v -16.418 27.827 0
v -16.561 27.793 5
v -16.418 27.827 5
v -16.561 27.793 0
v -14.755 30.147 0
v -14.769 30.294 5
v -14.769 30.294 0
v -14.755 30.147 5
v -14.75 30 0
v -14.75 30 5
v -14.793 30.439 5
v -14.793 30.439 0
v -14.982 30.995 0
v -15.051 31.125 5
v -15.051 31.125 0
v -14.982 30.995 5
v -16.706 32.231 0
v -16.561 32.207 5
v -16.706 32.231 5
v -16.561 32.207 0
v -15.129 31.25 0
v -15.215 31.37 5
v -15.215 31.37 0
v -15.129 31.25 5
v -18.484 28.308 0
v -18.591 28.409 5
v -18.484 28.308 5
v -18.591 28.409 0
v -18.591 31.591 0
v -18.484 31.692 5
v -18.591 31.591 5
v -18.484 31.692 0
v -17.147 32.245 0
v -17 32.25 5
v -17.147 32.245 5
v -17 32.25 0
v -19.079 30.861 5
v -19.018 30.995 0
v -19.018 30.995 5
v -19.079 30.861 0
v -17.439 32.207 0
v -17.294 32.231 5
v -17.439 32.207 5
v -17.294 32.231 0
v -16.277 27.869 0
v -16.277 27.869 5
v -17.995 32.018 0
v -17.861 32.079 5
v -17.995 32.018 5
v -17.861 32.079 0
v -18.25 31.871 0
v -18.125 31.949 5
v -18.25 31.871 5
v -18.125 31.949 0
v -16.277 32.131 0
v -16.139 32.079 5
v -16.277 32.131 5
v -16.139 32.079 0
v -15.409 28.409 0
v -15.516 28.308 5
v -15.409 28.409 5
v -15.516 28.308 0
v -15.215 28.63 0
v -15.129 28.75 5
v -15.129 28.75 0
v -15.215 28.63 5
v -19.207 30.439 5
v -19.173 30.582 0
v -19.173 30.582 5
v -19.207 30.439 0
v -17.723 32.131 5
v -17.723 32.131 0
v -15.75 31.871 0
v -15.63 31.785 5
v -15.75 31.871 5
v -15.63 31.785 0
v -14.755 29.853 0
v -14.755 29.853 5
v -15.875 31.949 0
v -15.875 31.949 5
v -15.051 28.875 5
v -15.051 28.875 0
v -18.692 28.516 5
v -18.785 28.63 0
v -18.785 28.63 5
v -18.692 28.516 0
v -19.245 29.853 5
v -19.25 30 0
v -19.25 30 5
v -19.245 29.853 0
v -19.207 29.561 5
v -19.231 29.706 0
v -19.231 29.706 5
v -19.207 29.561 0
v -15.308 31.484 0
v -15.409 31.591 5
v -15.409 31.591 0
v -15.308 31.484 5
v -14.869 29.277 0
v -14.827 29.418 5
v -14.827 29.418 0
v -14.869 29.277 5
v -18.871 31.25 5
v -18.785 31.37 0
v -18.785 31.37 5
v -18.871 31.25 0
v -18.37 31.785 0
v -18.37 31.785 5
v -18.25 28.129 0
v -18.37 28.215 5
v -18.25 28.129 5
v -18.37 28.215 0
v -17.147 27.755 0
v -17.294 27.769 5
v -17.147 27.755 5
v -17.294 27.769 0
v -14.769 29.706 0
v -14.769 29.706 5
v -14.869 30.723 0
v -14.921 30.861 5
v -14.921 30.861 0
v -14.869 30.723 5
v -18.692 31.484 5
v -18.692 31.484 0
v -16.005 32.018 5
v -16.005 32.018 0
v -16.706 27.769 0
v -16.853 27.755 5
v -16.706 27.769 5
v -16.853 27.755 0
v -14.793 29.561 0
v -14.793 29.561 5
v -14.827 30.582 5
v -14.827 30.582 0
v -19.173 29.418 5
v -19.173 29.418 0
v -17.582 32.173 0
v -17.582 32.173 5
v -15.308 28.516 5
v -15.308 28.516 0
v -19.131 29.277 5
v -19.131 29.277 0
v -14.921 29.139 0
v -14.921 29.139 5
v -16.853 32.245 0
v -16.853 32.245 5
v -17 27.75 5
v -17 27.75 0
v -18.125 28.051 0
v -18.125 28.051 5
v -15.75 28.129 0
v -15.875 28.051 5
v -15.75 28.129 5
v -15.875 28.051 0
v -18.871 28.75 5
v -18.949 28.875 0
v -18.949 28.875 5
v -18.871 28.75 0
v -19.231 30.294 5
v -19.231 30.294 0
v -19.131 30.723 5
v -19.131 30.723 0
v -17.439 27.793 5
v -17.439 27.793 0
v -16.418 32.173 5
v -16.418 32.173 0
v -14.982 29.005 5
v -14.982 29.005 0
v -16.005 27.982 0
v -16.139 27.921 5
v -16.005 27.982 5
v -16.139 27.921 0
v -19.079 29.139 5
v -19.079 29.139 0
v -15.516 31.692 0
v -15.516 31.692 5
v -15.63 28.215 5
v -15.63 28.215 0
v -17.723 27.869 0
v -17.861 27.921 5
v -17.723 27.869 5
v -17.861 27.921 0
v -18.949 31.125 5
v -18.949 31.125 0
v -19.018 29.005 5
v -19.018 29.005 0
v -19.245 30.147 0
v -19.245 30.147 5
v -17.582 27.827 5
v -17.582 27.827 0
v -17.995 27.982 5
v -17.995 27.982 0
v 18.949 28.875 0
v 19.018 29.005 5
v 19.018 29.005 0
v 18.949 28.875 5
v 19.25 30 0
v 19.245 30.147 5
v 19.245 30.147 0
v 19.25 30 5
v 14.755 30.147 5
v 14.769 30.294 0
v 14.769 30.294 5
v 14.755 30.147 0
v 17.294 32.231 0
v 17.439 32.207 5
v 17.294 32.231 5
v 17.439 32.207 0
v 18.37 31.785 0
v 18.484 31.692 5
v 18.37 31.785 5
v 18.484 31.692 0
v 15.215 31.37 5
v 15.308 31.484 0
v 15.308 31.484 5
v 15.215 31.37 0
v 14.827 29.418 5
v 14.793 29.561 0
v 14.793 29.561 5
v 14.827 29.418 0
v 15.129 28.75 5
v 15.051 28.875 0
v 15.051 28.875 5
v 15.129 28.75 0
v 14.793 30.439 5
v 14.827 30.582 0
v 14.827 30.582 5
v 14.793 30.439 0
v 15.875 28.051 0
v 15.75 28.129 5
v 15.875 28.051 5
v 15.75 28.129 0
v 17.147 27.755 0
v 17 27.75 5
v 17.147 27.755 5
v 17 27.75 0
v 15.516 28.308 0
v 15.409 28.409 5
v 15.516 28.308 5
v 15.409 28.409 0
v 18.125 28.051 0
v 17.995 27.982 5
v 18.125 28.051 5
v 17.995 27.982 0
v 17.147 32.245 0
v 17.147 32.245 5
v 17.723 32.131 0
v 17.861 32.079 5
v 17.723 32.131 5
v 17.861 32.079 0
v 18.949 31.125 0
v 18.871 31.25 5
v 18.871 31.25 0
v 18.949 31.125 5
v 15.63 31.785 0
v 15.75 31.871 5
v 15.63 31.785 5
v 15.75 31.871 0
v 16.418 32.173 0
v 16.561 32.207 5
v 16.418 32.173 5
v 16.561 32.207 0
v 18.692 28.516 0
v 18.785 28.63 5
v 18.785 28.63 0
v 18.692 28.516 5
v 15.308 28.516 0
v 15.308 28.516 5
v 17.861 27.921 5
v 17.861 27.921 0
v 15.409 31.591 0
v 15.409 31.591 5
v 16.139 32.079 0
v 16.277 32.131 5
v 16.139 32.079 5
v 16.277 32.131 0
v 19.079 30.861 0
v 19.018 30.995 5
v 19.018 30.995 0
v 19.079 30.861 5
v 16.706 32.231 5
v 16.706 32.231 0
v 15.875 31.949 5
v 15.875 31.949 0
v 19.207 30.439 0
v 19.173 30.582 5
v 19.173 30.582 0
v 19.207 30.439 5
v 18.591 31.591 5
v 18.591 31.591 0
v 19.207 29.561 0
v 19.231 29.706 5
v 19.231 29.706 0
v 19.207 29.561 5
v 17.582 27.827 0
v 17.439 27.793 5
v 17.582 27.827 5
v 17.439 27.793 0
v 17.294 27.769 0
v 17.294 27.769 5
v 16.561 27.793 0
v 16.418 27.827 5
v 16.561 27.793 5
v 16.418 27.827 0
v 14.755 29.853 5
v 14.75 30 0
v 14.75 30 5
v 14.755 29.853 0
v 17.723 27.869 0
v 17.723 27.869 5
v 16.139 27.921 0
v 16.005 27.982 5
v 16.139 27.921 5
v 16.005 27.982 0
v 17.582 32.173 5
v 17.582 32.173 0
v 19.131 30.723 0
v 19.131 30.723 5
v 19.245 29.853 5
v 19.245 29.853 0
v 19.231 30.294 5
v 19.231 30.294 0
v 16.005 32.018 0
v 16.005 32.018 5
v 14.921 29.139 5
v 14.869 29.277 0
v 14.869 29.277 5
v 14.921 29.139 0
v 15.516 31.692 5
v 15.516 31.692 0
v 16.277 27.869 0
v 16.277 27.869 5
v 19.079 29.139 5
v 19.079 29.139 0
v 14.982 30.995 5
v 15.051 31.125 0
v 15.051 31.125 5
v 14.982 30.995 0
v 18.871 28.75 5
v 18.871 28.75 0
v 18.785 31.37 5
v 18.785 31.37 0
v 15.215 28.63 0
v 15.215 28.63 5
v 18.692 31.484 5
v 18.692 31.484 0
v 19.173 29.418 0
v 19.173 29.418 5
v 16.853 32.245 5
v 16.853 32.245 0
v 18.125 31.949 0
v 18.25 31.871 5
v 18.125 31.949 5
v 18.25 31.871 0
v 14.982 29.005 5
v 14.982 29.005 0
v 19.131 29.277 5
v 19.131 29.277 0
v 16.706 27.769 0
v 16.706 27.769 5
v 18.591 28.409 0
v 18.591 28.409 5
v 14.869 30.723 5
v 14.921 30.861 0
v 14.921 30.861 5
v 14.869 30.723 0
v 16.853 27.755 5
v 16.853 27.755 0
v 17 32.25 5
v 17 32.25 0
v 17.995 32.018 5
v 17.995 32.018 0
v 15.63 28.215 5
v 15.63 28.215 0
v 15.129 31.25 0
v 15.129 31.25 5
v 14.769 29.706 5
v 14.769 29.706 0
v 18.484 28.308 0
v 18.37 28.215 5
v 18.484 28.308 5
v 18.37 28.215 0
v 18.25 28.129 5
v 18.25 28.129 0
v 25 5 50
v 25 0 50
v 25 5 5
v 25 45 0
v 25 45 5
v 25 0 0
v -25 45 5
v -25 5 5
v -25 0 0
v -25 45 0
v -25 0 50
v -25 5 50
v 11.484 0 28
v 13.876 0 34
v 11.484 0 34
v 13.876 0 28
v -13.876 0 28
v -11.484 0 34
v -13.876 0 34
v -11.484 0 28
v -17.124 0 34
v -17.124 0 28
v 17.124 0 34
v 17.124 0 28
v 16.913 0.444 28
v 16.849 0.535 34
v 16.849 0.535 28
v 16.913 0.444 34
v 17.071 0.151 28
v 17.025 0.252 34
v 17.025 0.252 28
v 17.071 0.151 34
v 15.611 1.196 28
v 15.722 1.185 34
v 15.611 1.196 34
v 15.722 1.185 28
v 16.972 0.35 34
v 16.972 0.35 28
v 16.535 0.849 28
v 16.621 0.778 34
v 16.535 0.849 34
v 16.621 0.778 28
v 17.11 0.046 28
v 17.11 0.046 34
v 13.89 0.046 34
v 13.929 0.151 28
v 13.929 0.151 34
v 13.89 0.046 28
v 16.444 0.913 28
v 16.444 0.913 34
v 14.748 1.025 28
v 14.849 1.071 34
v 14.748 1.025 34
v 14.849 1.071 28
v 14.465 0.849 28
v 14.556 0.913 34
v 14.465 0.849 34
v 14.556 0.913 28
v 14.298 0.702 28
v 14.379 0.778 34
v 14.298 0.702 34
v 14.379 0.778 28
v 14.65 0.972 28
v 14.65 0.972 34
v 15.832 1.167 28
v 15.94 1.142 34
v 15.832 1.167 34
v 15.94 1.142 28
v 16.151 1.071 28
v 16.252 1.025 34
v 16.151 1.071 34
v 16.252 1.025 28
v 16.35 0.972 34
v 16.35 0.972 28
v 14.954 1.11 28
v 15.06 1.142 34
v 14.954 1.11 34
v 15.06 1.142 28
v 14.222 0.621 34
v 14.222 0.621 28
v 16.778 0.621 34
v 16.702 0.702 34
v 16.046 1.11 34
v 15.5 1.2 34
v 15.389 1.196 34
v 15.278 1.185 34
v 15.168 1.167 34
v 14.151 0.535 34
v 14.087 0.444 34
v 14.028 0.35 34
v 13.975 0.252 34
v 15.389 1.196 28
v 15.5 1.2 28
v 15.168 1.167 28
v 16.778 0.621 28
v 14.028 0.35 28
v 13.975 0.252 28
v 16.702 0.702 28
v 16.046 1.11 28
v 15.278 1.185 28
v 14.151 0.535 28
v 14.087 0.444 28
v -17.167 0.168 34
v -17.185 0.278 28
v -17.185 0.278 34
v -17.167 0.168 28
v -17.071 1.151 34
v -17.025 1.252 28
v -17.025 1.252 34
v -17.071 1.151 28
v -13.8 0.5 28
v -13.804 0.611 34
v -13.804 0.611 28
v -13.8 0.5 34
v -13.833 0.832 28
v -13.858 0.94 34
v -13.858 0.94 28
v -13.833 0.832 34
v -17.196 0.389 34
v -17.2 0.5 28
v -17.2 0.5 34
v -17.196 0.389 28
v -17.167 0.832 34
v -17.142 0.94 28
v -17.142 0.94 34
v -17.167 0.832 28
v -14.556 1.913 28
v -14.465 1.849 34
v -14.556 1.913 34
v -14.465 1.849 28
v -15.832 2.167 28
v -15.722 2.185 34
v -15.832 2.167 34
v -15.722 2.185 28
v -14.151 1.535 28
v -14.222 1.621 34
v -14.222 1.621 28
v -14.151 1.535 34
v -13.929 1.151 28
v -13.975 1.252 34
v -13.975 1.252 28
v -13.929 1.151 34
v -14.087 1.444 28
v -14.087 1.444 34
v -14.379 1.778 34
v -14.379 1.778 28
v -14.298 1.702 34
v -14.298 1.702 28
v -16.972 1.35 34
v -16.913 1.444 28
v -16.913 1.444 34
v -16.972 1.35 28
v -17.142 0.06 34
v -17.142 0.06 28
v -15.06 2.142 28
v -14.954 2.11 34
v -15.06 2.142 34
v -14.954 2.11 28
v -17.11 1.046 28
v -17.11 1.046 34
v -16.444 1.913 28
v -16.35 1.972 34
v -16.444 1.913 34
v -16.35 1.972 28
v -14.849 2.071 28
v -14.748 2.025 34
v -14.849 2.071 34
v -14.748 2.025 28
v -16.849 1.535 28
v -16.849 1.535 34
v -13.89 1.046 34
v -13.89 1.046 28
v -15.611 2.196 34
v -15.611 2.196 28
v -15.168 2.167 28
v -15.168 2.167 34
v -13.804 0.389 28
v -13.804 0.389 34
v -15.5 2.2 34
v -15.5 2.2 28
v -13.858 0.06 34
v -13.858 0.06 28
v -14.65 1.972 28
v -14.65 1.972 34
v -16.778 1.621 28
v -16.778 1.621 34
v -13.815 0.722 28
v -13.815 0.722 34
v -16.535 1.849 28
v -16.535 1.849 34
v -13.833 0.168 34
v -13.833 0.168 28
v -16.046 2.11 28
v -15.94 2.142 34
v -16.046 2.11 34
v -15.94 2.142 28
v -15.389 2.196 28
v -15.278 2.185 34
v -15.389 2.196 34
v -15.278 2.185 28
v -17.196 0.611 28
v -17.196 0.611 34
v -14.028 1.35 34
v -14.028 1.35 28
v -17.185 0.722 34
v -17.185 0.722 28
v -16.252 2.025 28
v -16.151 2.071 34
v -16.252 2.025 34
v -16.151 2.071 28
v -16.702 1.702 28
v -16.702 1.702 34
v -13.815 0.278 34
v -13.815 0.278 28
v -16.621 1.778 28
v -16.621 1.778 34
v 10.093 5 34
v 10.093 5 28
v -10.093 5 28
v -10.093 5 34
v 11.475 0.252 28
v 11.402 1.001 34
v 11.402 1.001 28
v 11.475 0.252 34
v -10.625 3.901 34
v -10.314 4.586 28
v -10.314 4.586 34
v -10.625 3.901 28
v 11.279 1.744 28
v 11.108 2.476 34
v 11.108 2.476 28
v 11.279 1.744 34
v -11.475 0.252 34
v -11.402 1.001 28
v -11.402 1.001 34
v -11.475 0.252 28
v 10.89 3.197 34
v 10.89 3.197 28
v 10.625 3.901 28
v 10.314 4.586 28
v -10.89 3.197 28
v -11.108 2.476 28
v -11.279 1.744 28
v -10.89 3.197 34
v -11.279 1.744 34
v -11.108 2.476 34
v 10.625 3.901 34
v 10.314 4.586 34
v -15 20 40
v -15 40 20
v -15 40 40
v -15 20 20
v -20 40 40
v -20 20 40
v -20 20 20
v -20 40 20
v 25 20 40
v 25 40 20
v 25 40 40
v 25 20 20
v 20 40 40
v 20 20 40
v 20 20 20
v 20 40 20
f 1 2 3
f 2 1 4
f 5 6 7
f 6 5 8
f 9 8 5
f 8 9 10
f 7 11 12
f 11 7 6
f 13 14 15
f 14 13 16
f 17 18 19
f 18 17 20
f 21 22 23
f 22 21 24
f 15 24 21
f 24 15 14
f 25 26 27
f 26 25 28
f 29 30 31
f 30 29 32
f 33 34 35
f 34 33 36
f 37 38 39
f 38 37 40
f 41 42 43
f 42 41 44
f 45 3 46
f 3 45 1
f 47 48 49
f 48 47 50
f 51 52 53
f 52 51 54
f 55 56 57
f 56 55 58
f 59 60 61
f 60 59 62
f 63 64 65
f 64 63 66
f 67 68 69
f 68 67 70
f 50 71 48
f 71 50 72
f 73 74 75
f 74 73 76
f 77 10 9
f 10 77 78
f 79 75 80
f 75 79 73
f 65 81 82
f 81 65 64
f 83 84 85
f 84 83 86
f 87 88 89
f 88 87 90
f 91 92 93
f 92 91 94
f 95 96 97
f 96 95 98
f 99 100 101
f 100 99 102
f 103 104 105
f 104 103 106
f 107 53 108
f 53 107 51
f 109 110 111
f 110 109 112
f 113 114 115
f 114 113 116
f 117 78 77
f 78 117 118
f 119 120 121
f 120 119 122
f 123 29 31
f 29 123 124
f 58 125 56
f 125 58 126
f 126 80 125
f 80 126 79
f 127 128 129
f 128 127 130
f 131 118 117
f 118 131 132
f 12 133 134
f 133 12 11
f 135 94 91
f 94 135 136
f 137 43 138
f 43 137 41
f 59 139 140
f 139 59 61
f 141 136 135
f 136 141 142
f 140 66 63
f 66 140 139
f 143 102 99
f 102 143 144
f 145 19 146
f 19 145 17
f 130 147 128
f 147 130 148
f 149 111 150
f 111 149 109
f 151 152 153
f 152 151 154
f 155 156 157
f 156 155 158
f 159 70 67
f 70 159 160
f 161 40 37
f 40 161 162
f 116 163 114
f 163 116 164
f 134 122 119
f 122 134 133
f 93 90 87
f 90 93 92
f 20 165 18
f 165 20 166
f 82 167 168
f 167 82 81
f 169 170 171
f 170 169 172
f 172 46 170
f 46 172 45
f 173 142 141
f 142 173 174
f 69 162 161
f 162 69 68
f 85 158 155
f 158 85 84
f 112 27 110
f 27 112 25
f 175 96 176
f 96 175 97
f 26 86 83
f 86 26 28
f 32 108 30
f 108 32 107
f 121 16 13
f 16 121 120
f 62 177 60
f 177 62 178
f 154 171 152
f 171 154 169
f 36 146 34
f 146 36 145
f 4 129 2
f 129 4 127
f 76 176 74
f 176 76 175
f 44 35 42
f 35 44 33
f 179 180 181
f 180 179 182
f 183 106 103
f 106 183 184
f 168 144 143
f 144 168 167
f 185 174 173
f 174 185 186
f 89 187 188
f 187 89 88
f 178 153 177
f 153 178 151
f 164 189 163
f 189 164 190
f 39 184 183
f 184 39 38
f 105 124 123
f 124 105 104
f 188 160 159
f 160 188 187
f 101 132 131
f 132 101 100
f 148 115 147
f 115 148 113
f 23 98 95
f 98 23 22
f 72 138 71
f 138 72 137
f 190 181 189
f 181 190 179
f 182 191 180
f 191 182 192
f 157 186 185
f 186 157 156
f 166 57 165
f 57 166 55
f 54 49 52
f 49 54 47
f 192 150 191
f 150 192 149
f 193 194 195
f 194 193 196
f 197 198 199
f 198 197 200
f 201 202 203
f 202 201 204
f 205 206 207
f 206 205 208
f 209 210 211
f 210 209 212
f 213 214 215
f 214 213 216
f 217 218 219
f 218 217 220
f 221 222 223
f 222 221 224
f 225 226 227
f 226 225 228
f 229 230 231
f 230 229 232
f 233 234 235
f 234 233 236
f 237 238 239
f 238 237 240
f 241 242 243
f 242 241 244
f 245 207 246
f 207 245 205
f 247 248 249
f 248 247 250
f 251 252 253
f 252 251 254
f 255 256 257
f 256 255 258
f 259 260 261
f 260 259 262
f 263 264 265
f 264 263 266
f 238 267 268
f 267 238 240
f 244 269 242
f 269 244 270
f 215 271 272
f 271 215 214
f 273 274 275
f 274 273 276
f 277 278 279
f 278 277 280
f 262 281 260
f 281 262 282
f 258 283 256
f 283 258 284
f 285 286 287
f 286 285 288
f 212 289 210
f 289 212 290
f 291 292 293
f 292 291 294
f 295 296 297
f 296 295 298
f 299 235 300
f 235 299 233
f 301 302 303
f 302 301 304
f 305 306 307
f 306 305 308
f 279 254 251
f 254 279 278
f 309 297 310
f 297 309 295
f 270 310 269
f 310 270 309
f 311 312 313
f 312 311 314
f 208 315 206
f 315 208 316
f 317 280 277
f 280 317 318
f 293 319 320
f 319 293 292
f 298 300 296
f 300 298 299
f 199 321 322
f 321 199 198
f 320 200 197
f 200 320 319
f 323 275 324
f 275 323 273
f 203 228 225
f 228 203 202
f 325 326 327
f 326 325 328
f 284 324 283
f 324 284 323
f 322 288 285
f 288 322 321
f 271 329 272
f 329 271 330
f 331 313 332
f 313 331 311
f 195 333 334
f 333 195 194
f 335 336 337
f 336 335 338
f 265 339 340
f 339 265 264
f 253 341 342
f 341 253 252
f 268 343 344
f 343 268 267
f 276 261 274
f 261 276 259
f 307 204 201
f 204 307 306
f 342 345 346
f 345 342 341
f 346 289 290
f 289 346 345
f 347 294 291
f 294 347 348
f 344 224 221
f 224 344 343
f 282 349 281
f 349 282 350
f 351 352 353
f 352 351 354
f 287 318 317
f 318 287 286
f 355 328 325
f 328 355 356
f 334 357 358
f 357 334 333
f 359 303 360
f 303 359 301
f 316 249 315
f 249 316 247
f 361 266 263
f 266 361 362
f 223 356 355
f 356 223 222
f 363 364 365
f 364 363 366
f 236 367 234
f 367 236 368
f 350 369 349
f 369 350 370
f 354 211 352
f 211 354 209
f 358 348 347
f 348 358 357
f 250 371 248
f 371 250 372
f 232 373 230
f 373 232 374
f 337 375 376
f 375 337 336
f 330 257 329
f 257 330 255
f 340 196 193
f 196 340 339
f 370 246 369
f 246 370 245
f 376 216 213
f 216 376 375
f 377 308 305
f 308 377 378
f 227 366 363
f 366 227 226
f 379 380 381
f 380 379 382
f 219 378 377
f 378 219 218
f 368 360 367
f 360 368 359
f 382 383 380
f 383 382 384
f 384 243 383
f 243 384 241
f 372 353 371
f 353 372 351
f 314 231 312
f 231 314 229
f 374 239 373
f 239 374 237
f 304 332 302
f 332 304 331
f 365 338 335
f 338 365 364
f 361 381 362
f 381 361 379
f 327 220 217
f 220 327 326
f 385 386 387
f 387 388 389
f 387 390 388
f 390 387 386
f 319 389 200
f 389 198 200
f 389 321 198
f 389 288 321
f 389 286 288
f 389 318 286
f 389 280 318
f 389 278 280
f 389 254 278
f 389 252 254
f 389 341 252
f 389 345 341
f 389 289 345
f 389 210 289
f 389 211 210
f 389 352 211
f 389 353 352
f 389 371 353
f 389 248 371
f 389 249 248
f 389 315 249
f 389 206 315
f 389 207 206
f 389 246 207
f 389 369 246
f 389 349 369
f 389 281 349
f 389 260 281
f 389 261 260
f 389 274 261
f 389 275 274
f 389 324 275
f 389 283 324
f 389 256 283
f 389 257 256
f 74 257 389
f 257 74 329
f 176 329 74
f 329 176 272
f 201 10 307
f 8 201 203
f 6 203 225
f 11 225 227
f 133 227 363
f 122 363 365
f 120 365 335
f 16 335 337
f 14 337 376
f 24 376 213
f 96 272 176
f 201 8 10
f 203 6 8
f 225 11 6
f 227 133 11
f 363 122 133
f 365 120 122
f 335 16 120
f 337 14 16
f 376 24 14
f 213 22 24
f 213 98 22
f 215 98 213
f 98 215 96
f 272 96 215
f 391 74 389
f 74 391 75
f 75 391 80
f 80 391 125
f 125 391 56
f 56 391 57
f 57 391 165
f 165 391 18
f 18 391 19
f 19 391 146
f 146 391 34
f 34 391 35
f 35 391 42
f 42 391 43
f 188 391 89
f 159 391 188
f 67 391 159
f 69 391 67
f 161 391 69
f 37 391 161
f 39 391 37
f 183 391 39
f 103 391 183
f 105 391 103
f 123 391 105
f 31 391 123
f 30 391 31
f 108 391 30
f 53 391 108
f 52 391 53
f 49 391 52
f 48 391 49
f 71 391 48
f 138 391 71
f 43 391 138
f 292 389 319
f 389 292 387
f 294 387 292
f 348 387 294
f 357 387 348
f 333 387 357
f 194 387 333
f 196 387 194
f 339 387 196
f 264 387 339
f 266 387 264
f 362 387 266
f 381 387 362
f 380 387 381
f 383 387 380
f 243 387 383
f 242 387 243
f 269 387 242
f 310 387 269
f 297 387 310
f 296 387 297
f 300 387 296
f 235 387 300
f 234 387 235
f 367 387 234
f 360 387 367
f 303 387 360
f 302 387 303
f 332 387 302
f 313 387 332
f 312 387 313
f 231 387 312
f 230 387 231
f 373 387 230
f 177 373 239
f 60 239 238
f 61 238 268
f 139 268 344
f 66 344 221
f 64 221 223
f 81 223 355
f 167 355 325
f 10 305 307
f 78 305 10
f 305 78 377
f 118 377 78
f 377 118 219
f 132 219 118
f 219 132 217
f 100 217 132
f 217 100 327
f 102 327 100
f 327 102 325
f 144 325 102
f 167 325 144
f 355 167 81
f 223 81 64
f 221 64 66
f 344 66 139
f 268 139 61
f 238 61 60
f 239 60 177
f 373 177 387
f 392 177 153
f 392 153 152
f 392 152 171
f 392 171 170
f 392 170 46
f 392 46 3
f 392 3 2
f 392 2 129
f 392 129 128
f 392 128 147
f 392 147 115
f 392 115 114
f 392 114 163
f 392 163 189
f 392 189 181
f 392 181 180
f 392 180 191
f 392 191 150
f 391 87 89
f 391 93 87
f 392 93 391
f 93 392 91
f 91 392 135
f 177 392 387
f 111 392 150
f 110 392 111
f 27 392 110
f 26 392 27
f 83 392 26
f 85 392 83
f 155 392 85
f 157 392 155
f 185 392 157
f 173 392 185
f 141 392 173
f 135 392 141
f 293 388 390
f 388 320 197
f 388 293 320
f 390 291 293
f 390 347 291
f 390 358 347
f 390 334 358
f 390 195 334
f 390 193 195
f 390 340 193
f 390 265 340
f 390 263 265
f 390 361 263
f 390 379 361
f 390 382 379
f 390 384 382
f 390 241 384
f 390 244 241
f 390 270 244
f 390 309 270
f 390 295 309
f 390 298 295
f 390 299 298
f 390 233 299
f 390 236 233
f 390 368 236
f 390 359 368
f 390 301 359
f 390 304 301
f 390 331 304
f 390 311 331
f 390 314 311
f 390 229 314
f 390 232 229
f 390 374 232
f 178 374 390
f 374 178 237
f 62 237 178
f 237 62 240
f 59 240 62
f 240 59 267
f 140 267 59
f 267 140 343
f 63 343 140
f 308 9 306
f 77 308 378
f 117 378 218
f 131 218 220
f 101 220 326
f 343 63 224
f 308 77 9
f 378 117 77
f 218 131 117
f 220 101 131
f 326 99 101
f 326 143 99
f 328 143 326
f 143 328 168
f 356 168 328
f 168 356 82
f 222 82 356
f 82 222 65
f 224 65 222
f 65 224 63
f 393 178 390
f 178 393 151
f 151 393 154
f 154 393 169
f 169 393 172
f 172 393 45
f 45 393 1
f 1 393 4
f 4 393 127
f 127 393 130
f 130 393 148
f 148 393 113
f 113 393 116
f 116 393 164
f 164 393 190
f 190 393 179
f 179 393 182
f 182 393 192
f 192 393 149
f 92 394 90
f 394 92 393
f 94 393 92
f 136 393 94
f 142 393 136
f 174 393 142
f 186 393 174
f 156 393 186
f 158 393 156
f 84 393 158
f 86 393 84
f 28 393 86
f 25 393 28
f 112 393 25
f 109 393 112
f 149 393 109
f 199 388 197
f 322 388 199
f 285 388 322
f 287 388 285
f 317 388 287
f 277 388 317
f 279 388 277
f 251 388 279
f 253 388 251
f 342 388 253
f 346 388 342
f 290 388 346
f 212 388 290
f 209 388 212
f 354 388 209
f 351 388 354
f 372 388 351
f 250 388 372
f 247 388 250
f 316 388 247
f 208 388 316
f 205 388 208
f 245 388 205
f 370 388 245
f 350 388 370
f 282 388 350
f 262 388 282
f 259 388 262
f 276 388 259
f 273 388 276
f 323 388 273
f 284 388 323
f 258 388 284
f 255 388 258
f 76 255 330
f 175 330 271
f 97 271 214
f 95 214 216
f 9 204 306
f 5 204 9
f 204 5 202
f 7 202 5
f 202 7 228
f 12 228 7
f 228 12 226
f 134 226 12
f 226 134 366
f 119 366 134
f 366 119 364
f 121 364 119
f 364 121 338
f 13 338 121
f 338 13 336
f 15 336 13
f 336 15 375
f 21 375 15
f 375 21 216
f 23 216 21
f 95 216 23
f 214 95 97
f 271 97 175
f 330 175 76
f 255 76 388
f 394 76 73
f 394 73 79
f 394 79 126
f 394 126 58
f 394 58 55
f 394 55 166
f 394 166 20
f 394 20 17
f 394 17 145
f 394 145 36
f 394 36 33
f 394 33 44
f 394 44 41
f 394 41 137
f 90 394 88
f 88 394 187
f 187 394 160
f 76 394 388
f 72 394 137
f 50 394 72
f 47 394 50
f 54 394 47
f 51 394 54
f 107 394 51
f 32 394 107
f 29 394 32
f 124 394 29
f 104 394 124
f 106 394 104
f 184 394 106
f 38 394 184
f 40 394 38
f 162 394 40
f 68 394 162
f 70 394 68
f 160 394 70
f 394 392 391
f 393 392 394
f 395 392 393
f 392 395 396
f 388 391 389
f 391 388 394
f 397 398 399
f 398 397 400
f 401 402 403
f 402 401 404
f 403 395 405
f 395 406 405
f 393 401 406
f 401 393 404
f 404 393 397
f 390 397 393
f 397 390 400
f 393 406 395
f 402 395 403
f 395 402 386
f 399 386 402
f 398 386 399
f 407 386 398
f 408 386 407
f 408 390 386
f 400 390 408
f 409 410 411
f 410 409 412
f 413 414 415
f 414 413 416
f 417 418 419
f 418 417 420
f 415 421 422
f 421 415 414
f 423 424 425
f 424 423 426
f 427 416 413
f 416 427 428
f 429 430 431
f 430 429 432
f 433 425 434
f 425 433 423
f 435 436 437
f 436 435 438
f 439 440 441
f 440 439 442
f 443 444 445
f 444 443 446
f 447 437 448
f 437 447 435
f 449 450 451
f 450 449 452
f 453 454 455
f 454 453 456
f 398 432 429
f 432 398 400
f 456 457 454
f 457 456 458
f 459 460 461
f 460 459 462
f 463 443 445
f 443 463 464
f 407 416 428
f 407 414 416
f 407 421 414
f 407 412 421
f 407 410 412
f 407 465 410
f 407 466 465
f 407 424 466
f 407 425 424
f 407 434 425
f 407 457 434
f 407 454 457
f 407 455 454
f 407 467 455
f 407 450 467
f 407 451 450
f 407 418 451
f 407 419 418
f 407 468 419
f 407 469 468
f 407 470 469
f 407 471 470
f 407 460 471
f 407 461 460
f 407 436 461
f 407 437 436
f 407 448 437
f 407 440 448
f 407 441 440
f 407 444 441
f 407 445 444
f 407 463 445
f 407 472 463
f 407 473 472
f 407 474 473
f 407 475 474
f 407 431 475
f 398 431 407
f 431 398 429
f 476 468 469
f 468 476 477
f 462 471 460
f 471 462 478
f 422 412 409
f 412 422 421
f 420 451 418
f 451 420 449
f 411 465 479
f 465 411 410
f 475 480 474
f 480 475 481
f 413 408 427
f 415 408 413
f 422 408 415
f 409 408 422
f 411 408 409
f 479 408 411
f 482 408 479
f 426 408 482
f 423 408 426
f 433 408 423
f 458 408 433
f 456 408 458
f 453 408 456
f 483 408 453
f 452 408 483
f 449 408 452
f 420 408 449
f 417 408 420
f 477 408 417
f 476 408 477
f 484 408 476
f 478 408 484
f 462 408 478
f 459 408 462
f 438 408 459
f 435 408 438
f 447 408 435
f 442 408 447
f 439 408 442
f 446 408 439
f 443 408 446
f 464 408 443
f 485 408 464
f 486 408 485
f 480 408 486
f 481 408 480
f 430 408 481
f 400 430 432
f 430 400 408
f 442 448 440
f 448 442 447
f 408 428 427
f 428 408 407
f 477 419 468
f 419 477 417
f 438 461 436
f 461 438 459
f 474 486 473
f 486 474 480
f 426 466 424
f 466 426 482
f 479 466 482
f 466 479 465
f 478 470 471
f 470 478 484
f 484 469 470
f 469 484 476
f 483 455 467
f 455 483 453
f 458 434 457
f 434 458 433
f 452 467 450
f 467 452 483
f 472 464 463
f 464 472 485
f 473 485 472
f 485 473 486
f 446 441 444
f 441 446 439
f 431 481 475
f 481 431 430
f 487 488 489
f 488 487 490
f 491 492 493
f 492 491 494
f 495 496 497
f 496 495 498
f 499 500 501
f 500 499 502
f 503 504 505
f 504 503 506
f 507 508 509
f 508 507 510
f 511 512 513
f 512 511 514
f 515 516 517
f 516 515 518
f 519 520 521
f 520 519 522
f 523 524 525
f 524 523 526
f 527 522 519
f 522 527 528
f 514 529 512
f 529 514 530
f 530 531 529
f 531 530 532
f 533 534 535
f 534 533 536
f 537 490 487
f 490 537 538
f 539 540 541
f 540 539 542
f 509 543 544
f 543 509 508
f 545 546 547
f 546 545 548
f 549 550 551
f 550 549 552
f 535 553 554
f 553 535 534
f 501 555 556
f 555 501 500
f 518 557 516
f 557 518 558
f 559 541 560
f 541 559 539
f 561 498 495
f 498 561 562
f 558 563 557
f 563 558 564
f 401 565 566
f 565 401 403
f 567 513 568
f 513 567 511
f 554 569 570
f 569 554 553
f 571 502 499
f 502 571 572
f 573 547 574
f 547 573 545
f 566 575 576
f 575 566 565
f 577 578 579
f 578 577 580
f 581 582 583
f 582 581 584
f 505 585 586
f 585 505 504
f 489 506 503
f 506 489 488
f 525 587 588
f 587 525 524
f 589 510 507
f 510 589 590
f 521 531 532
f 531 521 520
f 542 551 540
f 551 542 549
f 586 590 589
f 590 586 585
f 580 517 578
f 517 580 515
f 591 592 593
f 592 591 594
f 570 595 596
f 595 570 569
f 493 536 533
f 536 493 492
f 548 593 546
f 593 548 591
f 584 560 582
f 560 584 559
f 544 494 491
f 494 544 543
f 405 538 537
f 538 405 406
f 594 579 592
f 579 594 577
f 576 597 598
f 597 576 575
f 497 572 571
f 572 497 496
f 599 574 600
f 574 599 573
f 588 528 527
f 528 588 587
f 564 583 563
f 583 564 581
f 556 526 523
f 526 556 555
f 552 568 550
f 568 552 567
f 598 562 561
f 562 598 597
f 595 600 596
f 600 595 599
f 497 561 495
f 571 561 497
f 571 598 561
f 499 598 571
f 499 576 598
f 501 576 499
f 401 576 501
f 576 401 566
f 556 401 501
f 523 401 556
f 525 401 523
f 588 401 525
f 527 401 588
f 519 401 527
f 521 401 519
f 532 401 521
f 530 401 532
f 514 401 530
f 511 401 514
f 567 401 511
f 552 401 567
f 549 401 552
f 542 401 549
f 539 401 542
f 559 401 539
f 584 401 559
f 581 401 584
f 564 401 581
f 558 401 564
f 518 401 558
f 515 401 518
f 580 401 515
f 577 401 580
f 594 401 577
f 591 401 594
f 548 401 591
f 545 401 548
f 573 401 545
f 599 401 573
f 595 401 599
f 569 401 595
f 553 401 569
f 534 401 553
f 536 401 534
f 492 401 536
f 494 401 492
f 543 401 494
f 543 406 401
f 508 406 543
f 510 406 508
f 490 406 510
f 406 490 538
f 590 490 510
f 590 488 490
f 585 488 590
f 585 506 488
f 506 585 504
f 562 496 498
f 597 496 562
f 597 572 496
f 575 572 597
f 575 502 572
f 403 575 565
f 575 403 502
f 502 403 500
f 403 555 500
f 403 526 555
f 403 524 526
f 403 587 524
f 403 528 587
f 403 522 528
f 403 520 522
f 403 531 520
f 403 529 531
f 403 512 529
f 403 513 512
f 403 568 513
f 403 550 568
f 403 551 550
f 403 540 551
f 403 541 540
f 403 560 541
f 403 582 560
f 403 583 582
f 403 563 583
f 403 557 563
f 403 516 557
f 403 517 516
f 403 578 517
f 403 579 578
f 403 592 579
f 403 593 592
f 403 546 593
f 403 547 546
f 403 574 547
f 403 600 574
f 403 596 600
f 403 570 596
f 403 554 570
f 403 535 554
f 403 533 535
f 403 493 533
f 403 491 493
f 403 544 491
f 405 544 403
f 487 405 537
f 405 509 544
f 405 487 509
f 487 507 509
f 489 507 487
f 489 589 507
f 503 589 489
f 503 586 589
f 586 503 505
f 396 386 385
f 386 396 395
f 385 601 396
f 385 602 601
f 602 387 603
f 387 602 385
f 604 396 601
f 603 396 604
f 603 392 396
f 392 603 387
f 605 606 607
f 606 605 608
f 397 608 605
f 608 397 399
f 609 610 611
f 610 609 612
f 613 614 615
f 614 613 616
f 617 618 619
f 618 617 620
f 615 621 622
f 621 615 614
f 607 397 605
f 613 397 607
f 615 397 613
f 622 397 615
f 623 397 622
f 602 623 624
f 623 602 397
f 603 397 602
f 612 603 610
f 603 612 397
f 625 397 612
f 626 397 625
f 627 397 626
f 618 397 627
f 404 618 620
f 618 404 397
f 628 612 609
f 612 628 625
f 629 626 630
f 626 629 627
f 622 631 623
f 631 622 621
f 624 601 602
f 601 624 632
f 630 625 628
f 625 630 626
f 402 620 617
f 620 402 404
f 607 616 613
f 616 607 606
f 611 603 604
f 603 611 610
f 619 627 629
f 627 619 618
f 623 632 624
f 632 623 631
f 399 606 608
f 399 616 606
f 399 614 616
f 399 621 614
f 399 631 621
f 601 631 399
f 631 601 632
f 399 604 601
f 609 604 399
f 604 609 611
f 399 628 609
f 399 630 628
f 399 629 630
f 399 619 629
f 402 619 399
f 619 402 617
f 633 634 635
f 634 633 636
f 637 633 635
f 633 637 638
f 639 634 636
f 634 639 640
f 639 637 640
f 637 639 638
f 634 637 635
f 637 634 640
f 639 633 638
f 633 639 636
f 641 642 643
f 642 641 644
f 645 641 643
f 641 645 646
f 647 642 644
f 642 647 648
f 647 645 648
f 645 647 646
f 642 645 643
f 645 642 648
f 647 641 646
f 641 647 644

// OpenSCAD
// L-shaped mounting bracket for NEMA 17 stepper motor (e.g. syringe pump)
// Print orientation: base plate on the bed, motor plate building upward.

// ---------------- Parameters ----------------
base_x0      = -25;   // base plate, x start (mm)
base_x1      = 25;    // base plate, x end (mm)
base_y0      = 0;     // base plate, y start (mm)
base_y1      = 45;    // base plate, y end (mm)
base_z0      = 0;     // base plate, z start (mm)
base_z1      = 5;     // base plate, z end (mm)
base_hole_r  = 2.25;  // M4 through-hole radius (mm)
base_hole_x  = 17;    // base through-hole x offset (mm)
base_hole_y  = 30;    // base through-hole y offset (mm)

motor_x0     = -25;   // motor plate, x start (mm)
motor_x1     = 25;    // motor plate, x end (mm)
motor_y0     = 0;     // motor plate, y start (mm)
motor_y1     = 5;     // motor plate, y end (mm)
motor_z0     = 0;     // motor plate, z start (mm)
motor_z1     = 50;    // motor plate, z end (mm)
motor_boss_r = 11.5;  // motor boss hole radius (mm)
motor_boss_z = 28;    // motor boss hole centre height (mm)
motor_screw_r = 1.7;  // M3 screw hole radius (mm)
motor_screw_p = 31;   // motor screw pattern size (mm)

gusset_t     = 5;     // gusset thickness (mm)
gusset_leg   = 20;    // gusset leg length (mm)

eps          = 0.5;   // cutter overshoot (mm)
$fn          = 96;    // curve resolution

// ---------------- Model ----------------
union() {
    // Base plate with two M4 through-holes
    difference() {
        translate([base_x0, base_y0, base_z0])
            cube([base_x1 - base_x0, base_y1 - base_y0, base_z1]);
        for (sx = [-1, 1])
            translate([sx * base_hole_x, base_hole_y, -eps])
                cylinder(r = base_hole_r, h = base_z1 + 2 * eps);
    }

    // Vertical motor plate with boss hole and four M3 screw holes
    difference() {
        translate([motor_x0, motor_y0, motor_z0])
            cube([motor_x1 - motor_x0, motor_y1 - motor_y0, motor_z1]);
        translate([0, -eps, motor_boss_z])
            cylinder(r = motor_boss_r, h = motor_y1 - motor_y0 + 2 * eps);
        for (a = [0, 90, 180, 270])
            rotate([0, 0, a])
                translate([motor_screw_p / 2, -eps, motor_boss_z])
                    cylinder(r = motor_screw_r, h = motor_y1 - motor_y0 + 2 * eps);
    }

    // Right-hand gusset, flush with the motor plate
    translate([motor_x0 + gusset_t, gusset_leg, gusset_leg])
        cube([gusset_t, gusset_leg, gusset_leg]);

    // Left-hand gusset, flush with the base plate
    translate([base_x1 - gusset_t, gusset_leg, gusset_leg])
        cube([gusset_t, gusset_leg, gusset_leg]);
}
